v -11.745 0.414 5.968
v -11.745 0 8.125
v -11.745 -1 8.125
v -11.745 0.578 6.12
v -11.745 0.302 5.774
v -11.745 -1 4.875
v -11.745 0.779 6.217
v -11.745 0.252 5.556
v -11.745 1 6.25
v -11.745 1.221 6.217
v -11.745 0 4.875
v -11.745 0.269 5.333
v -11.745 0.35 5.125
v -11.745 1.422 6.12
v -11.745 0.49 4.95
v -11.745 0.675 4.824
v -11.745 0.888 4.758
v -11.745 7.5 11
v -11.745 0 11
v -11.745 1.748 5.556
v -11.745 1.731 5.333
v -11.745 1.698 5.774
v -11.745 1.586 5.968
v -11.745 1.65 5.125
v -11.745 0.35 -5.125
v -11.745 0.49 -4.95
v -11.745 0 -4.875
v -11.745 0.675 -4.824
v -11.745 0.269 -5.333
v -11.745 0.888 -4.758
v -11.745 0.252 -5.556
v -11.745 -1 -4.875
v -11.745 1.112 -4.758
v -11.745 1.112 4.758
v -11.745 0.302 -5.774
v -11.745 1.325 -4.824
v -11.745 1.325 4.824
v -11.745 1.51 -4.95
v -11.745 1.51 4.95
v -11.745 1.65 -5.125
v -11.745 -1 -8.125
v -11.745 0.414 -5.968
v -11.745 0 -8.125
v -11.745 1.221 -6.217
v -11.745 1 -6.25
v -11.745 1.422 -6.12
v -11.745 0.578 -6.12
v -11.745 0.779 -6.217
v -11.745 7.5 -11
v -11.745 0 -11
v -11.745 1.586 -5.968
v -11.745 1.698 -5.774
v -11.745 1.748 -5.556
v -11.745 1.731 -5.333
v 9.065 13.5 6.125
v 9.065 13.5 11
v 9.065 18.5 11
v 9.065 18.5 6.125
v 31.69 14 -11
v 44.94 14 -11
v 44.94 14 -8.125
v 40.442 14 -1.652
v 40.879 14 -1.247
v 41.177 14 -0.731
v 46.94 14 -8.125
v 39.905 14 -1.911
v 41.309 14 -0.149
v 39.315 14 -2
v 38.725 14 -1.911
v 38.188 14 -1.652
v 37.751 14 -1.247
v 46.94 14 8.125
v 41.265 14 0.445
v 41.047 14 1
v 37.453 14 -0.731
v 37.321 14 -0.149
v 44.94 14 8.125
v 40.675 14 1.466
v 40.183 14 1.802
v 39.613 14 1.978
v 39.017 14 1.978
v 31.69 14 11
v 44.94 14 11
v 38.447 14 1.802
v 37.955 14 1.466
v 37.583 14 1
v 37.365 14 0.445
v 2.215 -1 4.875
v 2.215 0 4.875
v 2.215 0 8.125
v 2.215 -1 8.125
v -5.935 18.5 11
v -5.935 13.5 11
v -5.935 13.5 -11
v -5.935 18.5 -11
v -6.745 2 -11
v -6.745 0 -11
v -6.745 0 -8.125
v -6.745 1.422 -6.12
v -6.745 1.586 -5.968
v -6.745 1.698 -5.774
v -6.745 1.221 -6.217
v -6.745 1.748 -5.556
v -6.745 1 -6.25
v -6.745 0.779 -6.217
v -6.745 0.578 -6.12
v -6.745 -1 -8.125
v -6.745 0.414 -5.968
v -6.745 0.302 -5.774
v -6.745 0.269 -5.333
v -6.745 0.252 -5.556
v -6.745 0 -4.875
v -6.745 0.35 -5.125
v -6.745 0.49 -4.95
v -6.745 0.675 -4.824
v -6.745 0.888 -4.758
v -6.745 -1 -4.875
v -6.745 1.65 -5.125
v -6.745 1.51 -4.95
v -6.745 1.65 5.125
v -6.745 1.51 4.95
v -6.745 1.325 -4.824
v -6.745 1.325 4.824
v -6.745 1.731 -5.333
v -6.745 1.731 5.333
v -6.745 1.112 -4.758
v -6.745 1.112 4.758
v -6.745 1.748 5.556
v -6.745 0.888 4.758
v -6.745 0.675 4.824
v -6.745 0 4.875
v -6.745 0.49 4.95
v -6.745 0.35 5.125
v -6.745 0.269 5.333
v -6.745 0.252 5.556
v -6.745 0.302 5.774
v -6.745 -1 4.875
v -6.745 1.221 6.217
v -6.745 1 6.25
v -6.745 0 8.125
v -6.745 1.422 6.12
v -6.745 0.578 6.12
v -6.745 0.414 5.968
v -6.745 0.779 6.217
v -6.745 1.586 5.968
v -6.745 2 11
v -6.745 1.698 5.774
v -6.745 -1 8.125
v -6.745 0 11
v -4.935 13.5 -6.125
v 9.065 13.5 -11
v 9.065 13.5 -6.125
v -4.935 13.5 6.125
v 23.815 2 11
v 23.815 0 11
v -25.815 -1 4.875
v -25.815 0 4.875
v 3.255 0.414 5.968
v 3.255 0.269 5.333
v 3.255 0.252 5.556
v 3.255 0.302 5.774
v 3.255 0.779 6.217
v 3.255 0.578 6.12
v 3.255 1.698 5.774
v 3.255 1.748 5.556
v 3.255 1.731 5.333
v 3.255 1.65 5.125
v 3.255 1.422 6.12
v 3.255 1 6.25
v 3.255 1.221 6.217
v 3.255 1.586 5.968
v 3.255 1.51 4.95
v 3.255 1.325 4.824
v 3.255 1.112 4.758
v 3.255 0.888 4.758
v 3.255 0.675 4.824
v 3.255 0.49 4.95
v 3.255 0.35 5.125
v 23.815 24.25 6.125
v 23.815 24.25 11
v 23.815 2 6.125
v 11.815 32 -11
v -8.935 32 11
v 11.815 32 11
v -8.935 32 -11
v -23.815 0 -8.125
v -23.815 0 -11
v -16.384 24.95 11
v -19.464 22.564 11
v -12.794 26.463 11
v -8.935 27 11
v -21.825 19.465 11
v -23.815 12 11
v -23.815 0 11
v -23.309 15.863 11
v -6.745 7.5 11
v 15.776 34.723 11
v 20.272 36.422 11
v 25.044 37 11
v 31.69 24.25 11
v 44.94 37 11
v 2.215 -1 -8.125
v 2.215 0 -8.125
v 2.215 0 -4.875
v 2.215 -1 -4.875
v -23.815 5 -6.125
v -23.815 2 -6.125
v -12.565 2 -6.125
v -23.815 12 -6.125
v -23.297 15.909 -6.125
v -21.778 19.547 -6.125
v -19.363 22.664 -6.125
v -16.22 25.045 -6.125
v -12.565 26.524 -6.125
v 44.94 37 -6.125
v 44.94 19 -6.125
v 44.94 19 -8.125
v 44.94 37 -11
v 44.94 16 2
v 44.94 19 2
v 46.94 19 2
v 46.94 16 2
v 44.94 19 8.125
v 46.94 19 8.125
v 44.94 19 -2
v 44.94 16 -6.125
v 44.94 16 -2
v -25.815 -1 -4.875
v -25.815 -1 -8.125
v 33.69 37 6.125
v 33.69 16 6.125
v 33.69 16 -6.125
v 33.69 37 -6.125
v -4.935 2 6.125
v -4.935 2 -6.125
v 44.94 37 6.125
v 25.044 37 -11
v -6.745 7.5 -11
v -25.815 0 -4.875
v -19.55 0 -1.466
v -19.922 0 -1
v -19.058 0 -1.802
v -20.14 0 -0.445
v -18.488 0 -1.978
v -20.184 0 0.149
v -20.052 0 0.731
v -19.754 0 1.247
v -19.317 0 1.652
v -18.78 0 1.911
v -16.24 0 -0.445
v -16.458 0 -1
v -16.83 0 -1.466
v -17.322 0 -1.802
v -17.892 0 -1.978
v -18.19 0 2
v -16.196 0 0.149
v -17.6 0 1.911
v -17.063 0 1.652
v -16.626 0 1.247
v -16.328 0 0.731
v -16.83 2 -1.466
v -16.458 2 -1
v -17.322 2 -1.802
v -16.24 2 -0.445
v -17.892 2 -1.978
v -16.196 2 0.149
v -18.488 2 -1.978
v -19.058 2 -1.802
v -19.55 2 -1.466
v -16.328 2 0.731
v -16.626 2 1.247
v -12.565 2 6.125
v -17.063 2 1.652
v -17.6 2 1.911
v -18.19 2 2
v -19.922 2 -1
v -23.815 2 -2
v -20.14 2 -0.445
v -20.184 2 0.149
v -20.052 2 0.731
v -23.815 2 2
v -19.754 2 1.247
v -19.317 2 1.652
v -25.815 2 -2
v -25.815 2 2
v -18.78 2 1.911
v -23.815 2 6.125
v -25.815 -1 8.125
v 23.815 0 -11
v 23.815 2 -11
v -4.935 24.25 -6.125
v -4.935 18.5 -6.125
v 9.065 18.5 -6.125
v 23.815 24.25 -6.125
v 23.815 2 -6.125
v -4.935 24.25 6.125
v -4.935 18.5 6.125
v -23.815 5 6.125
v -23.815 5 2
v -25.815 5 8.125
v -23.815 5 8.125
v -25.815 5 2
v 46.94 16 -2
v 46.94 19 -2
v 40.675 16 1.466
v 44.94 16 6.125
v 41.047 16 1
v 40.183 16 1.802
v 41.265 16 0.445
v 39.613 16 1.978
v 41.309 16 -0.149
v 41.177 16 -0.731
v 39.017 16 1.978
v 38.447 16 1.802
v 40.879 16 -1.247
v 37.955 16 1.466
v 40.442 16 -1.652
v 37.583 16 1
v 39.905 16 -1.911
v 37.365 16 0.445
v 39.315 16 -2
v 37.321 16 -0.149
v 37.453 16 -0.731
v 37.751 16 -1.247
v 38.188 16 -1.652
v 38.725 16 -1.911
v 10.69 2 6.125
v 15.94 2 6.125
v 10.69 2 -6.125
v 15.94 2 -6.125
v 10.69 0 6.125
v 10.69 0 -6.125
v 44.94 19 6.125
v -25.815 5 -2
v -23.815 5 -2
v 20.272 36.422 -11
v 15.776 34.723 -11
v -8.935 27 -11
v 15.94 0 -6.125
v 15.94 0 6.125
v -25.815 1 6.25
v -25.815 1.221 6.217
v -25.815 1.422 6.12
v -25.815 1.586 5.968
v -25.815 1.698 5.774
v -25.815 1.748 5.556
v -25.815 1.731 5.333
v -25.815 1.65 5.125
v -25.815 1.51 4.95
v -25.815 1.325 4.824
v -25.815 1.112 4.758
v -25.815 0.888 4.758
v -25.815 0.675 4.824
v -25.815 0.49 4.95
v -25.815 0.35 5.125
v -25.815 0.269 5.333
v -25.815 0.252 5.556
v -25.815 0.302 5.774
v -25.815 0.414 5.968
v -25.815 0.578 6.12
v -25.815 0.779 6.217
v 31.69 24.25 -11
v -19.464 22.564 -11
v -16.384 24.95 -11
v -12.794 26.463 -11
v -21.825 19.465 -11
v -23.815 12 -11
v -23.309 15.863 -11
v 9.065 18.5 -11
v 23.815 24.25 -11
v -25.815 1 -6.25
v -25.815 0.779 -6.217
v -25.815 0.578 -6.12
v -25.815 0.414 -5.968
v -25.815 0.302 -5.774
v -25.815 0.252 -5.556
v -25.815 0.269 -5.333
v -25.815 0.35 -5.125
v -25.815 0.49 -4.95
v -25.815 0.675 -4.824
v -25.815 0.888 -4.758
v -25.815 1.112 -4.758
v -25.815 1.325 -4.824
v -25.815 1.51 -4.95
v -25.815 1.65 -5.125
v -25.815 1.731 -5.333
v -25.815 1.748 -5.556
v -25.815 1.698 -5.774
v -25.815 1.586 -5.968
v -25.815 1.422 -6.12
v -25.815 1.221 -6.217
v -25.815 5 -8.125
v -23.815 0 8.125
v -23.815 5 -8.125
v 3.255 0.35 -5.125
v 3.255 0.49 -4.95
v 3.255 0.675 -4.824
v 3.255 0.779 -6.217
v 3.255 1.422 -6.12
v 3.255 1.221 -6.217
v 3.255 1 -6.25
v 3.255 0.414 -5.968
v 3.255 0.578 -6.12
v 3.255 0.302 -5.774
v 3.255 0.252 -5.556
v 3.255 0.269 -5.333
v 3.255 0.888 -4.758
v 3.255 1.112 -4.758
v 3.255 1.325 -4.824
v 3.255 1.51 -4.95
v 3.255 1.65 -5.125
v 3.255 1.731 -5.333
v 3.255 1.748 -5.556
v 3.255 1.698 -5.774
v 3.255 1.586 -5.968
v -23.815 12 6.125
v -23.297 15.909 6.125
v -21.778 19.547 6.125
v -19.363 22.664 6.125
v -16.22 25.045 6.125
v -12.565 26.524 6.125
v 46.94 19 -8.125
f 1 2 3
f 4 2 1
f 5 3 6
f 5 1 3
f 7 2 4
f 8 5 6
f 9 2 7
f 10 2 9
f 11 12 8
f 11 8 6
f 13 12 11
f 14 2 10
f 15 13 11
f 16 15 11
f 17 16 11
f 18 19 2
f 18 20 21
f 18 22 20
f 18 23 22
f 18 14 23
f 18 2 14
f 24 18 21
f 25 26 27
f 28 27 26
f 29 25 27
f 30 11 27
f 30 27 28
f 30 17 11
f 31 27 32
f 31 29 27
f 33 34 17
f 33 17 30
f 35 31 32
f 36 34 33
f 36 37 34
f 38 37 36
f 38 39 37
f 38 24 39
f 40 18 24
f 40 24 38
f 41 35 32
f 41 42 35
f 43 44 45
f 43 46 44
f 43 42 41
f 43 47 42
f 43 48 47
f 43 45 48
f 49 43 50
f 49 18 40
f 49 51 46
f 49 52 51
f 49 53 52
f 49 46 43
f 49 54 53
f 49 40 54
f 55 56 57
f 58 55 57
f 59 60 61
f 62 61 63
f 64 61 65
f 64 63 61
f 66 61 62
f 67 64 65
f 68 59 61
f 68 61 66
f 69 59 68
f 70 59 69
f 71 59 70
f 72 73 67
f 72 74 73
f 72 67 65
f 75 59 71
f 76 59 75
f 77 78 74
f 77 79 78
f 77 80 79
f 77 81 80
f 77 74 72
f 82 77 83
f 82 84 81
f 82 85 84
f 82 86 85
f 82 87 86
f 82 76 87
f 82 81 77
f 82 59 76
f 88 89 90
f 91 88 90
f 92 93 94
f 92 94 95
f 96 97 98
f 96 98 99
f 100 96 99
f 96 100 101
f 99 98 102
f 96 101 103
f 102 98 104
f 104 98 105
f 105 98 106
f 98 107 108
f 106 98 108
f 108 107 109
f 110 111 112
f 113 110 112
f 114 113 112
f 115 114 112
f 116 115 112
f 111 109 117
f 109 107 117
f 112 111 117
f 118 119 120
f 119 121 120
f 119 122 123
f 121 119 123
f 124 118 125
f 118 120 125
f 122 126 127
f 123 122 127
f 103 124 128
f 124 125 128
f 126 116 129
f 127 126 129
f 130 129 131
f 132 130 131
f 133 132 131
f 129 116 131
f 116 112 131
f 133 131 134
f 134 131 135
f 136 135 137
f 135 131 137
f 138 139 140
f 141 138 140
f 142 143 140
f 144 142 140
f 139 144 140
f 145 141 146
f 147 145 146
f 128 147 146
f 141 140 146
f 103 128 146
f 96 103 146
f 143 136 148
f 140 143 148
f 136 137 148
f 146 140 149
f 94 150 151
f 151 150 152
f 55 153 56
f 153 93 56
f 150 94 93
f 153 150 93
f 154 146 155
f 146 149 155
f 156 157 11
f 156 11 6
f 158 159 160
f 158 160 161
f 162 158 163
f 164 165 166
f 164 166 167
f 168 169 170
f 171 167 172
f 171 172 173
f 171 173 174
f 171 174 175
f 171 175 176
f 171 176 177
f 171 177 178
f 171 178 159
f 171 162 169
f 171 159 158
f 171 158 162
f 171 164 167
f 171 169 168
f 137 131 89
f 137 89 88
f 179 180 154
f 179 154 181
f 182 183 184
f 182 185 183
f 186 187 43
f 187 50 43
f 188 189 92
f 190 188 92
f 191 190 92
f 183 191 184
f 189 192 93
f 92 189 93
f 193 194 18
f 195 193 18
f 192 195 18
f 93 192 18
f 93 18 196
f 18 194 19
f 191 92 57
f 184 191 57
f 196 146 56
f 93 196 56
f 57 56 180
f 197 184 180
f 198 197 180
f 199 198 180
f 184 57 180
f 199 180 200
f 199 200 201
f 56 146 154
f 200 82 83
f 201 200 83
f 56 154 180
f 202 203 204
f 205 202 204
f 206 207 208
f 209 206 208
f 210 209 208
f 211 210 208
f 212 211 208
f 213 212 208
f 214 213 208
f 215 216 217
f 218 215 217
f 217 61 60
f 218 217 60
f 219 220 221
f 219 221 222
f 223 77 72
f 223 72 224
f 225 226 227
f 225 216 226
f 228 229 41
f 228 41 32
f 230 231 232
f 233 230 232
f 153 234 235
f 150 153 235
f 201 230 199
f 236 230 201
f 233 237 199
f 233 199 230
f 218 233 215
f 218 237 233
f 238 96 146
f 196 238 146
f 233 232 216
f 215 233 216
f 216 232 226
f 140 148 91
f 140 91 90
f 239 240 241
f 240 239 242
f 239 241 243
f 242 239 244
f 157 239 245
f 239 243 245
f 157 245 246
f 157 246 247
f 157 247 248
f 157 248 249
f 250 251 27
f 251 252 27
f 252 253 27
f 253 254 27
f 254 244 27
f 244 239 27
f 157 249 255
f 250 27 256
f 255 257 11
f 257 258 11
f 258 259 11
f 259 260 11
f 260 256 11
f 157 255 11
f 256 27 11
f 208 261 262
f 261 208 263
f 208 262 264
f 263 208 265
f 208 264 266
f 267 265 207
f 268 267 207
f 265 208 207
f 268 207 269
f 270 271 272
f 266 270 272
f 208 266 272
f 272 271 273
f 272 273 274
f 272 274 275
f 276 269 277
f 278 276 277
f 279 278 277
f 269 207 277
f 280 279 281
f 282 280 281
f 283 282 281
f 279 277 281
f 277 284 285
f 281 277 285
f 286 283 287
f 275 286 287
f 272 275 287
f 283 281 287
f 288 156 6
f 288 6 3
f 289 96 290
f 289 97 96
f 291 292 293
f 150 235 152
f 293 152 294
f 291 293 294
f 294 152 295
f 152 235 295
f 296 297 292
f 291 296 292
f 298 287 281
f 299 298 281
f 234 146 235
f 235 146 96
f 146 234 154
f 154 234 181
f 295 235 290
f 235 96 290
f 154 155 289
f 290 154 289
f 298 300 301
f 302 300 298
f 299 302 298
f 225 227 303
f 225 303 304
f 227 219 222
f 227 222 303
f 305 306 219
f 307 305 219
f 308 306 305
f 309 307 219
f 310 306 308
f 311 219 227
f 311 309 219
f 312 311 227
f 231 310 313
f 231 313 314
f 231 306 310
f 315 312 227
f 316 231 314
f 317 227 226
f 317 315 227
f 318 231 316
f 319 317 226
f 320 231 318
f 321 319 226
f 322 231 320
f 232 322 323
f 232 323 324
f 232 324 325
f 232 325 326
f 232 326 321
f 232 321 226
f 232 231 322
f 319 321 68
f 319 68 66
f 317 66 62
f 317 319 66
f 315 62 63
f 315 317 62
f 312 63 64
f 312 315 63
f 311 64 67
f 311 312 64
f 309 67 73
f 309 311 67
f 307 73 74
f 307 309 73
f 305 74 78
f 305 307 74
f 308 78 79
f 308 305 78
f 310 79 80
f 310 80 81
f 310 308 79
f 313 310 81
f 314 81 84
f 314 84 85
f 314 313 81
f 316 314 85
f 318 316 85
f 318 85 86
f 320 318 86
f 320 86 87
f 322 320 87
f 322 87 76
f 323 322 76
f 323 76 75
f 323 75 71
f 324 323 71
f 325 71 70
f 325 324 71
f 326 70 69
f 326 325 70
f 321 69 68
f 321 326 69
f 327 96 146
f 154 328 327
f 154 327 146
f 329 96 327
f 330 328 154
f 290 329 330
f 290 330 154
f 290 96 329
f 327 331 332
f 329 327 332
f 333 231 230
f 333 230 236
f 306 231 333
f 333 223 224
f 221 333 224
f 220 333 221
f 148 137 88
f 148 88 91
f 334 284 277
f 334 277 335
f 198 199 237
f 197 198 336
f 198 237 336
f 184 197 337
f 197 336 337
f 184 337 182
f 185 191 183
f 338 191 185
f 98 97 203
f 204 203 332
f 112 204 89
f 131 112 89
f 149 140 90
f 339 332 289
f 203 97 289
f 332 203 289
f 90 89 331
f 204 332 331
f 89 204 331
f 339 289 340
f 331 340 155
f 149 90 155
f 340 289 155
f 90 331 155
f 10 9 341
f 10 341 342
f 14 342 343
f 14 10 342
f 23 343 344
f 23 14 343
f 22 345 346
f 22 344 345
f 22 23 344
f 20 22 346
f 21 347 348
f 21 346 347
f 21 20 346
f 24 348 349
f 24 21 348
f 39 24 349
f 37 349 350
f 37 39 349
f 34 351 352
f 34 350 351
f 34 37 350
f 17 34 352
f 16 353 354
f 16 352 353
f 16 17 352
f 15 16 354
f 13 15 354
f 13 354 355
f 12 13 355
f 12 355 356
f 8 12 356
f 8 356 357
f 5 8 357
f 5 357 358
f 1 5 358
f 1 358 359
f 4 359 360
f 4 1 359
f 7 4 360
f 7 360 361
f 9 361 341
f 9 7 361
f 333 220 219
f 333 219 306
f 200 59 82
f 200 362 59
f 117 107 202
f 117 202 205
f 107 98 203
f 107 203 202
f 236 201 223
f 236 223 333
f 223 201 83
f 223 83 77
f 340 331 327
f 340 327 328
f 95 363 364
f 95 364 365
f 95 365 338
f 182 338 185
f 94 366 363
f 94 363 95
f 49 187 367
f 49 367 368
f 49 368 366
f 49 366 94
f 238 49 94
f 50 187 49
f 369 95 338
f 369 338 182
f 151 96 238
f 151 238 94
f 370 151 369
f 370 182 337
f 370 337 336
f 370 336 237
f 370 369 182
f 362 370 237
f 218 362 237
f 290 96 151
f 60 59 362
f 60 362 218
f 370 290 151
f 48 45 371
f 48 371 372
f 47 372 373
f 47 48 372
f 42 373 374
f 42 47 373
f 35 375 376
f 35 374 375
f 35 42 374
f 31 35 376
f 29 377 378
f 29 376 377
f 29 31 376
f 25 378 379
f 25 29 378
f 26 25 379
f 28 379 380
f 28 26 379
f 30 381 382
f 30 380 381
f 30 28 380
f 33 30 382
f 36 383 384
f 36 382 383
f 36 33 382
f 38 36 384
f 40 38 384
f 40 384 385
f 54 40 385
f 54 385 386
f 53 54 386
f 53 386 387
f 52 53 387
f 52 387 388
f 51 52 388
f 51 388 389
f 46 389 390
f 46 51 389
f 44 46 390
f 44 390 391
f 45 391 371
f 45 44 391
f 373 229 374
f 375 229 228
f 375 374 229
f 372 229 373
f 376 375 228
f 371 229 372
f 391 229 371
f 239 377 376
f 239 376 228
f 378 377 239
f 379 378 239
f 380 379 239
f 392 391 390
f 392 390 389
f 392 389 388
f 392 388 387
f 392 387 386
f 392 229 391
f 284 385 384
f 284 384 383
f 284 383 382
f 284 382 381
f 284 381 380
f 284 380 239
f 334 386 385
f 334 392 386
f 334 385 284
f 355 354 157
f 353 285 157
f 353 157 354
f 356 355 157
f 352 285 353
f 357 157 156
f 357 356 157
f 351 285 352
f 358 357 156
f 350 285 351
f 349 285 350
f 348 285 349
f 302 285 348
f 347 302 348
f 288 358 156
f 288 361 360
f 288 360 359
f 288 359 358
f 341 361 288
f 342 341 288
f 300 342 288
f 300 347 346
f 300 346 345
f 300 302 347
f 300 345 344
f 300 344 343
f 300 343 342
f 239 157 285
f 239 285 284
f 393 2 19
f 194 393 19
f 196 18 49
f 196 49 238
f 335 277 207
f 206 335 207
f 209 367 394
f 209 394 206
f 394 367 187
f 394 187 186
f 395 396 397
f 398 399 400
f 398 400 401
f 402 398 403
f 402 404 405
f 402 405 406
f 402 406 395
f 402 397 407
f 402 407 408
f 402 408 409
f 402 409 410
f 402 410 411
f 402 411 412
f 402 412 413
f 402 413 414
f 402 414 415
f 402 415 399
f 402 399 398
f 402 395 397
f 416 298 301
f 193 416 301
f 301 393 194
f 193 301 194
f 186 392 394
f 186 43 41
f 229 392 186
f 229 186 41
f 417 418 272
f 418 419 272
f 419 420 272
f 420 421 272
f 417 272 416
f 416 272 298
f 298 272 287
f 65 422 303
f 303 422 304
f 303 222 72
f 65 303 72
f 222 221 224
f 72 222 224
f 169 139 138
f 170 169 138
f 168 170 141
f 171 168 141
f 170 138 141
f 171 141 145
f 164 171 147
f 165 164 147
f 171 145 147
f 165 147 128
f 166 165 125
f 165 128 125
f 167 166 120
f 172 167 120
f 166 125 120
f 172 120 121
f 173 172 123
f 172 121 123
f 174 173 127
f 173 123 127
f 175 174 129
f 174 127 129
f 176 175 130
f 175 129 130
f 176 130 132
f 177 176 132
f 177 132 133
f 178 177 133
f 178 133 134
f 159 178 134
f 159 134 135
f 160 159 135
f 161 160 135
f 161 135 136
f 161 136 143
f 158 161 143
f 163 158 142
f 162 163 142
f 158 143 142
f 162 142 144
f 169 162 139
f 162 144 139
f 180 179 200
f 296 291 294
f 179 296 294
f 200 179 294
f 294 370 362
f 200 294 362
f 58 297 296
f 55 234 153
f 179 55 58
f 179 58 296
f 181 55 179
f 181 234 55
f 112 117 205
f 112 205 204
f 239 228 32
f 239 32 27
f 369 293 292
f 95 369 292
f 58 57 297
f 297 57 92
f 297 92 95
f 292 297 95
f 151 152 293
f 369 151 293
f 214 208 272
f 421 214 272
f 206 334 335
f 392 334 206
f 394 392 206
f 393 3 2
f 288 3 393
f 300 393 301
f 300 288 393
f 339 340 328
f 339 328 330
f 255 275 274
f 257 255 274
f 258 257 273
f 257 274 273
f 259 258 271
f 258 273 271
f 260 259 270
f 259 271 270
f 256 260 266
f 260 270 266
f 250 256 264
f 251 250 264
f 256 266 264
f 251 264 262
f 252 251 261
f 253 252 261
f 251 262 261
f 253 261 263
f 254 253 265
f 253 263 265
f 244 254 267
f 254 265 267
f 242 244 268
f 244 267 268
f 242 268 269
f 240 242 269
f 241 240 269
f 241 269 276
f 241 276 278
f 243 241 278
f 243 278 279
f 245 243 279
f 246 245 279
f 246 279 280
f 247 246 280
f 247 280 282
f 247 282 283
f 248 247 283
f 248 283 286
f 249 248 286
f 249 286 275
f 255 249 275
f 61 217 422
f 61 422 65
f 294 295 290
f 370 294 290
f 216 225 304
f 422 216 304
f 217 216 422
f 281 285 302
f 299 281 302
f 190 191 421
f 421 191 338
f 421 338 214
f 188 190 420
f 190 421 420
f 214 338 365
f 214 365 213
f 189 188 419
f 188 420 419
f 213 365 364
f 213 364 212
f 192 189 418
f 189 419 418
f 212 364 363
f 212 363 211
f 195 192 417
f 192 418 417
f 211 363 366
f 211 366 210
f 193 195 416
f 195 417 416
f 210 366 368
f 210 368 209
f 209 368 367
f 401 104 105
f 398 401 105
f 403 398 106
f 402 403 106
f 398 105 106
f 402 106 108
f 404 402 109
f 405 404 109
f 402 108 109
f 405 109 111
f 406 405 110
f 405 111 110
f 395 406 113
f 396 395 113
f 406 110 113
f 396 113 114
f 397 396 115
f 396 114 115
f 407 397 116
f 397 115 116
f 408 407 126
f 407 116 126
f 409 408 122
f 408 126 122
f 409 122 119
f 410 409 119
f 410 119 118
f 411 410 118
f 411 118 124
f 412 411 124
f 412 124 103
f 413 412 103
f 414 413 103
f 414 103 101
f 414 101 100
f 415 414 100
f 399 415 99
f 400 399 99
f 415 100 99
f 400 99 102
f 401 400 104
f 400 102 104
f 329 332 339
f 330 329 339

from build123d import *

# Parameters (mm, degrees)
SKETCH1_W              = 47.63
SKETCH1_H              = 22
SKETCH1_W_2            = 5.25
SKETCH1_H_2            = 12.25
BOSS_EXTRUDE1_DEPTH    = 2
SKETCH3_W              = 32.75
SKETCH3_H              = 22
BOSS_EXTRUDE2_DEPTH    = 30
SKETCH2_W              = 28.75
SKETCH2_H              = 12.25
CUT_EXTRUDE1_DEPTH     = 22.25
BOSS_EXTRUDE7_DEPTH    = 25
SKETCH19_W             = 16.25
SKETCH19_H             = 2
BOSS_EXTRUDE8_DEPTH    = 2
SKETCH20_W             = 2
SKETCH20_H             = 16.25
BOSS_EXTRUDE9_DEPTH    = 3
SKETCH39_W             = 4
SKETCH39_H             = 3
CUT_EXTRUDE16_DEPTH    = 2
BOSS_EXTRUDE11_DEPTH   = 28.03
SKETCH10_W             = 5
SKETCH10_H             = 22
CUT_EXTRUDE6_DEPTH     = 7.5
SKETCH21_R             = 0.75
CUT_EXTRUDE12_DEPTH    = 10
SKETCH21_5_R           = 0.75
CUT_EXTRUDE13_DEPTH    = 46.595105
SKETCH10_3_W           = 5
SKETCH10_3_H           = 2.875
SKETCH10_3_H_2         = 3.25
SKETCH10_3_H_3         = 9.75
CUT_EXTRUDE14_DEPTH    = 43.560712224
SKETCH25_W             = 14
SKETCH25_H             = 5
SKETCH25_W_2           = 1
CUT_EXTRUDE15_DEPTH    = 47.630614675
FILLET2_R              = 15
SKETCH29_W             = 9.875
SKETCH29_H             = 22
BOSS_EXTRUDE12_DEPTH   = 7.75
SKETCH30_W             = 11.25
SKETCH30_H             = 4.875
BOSS_EXTRUDE13_DEPTH   = 16
SKETCH36_W             = 13.25
SKETCH36_H             = 22
SKETCH36_R             = 2
BOSS_EXTRUDE16_DEPTH   = 2
SKETCH30_4_W           = 11.25
SKETCH30_4_H           = 4.875
BOSS_EXTRUDE18_DEPTH   = 5
BOSS_EXTRUDE19_DEPTH   = 2
SKETCH29_3_W           = 9.875
SKETCH29_3_H           = 22
BOSS_EXTRUDE20_DEPTH   = 5
SKETCH40_W             = 12
SKETCH40_H             = 22
BOSS_EXTRUDE21_DEPTH   = 5
FILLET5_R              = 20
SPLIT2_SURFACE_1_BACK  = 85.978
SPLIT2_SURFACE_1_DEPTH = 171.956
SPLIT2_SURFACE_2_BACK  = 85.978
SPLIT2_SURFACE_2_DEPTH = 171.956
SKETCH45_R             = 2
CUT_EXTRUDE17_DEPTH    = 60.57653565


with BuildPart() as part:
    # Sketch1 → Boss-Extrude1 (new body)
    with BuildSketch(Plane(origin=(0, 0, 0), x_dir=(1, 0, 0), z_dir=(0, 1, 0))):
        Rectangle(SKETCH1_W, SKETCH1_H)
        with Locations((13.315, 0)):
            Rectangle(SKETCH1_W_2, SKETCH1_H_2, mode=Mode.SUBTRACT)
    extrude(amount=BOSS_EXTRUDE1_DEPTH)

    # Sketch3 → Boss-Extrude2 (add)
    with BuildSketch(Plane(origin=(0, 2, 0), x_dir=(1, 0, 0), z_dir=(0, 1, 0))):
        with Locations((7.44, 0)):
            Rectangle(SKETCH3_W, SKETCH3_H)
    extrude(amount=BOSS_EXTRUDE2_DEPTH)

    # Sketch2 → Cut-Extrude1 (cut)
    with BuildSketch(Plane(origin=(0, 2, 0), x_dir=(1, 0, 0), z_dir=(0, 1, 0))):
        with Locations((9.44, 0)):
            Rectangle(SKETCH2_W, SKETCH2_H)
    extrude(amount=CUT_EXTRUDE1_DEPTH, mode=Mode.SUBTRACT)

    # Sketch18 → Boss-Extrude7 (add)
    with BuildSketch(Plane(origin=(0, 2, 0), x_dir=(1, 0, 0), z_dir=(0, 1, 0))):
        Polygon((-23.815, 11), (-23.815, 6.125), (-12.565, 6.125), (-12.565, -6.125), (-23.815, -6.125), (-23.815, -11), (-8.935, -11), (-8.935, 11), align=None)
    extrude(amount=BOSS_EXTRUDE7_DEPTH)

    # Sketch19 → Boss-Extrude8 (add)
    with BuildSketch(Plane.ZY.offset(23.815)):
        with Locations((0, 1)):
            Rectangle(SKETCH19_W, SKETCH19_H)
    extrude(amount=BOSS_EXTRUDE8_DEPTH)

    # Sketch20 → Boss-Extrude9 (add)
    with BuildSketch(Plane(origin=(0, 2, 0), x_dir=(1, 0, 0), z_dir=(0, 1, 0))):
        with Locations((-24.815, 0)):
            Rectangle(SKETCH20_W, SKETCH20_H)
    extrude(amount=BOSS_EXTRUDE9_DEPTH)

    # Sketch39 → Cut-Extrude16 (cut)
    with BuildSketch(Plane.ZY.offset(25.815)):
        with Locations((0, 3.5)):
            Rectangle(SKETCH39_W, SKETCH39_H)
    extrude(amount=-CUT_EXTRUDE16_DEPTH, mode=Mode.SUBTRACT)

    # Sketch24 → Boss-Extrude11 (add)
    with BuildSketch(Plane.ZY.offset(25.815)):
        Polygon((-8.125, 0), (-8.125, -1), (-4.875, -1), (-4.875, 0), (-4.875, 0.25), (-8.125, 0.25), align=None)
        Polygon((8.125, 0), (8.125, 0.25), (4.875, 0.25), (4.875, 0), (4.875, -1), (8.125, -1), align=None)
    extrude(amount=-BOSS_EXTRUDE11_DEPTH)

    # Sketch10 → Cut-Extrude6 (cut)
    with BuildSketch(Plane.XZ):
        with Locations((-9.245, 0)):
            Rectangle(SKETCH10_W, SKETCH10_H)
    extrude(amount=-CUT_EXTRUDE6_DEPTH, mode=Mode.SUBTRACT)

    # Sketch21 → Cut-Extrude12 (cut)
    with BuildSketch(Plane.ZY.offset(6.745)):
        with Locations((5.5, 1)):
            Circle(SKETCH21_R)
        with Locations(Location((-5.5, 1, 0), (0, 0, 180))):
            Circle(SKETCH21_R)
    extrude(amount=-CUT_EXTRUDE12_DEPTH, mode=Mode.SUBTRACT)

    # Sketch21<5> → Cut-Extrude13 (cut, through all)
    with BuildSketch(Plane.ZY.offset(6.745)):
        with Locations((5.5, 1)):
            Circle(SKETCH21_5_R)
        with Locations(Location((-5.5, 1, 0), (0, 0, 180))):
            Circle(SKETCH21_5_R)
    extrude(amount=CUT_EXTRUDE13_DEPTH, mode=Mode.SUBTRACT)

    # Sketch10<3> → Cut-Extrude14 (cut, through all)
    with BuildSketch(Plane.XZ):
        with Locations((-9.245, -9.5625)):
            Rectangle(SKETCH10_3_W, SKETCH10_3_H)
        with Locations((-9.245, -6.5)):
            Rectangle(SKETCH10_3_W, SKETCH10_3_H_2)
        with Locations((-9.245, 0)):
            Rectangle(SKETCH10_3_W, SKETCH10_3_H_3)
        with Locations((-9.245, 6.5)):
            Rectangle(SKETCH10_3_W, SKETCH10_3_H_2)
        with Locations((-9.245, 9.5625)):
            Rectangle(SKETCH10_3_W, SKETCH10_3_H)
    extrude(amount=CUT_EXTRUDE14_DEPTH, mode=Mode.SUBTRACT)

    # Sketch25 → Cut-Extrude15 (cut, through all)
    with BuildSketch(Plane.XY.offset(11)):
        with Locations((2.065, 16)):
            Rectangle(SKETCH25_W, SKETCH25_H)
        with Locations((-5.435, 16)):
            Rectangle(SKETCH25_W_2, SKETCH25_H)
    extrude(amount=-CUT_EXTRUDE15_DEPTH, mode=Mode.SUBTRACT)

    # Fillet2
    # the kernel refuses this fillet: 15 mm, written as the material it takes off along each edge
    with BuildSketch(Plane(origin=(-23.815, 27, -31.375), x_dir=(1, 0, 0), z_dir=(0, 0, 1))) as fillet2_piece_1_section:
        with BuildLine():
            CenterArc((FILLET2_R, -FILLET2_R), FILLET2_R, 90, 90)
            Line((0, -FILLET2_R), (0, 0))
            Line((0, 0), (FILLET2_R, 0))
        make_face()
    fillet2_piece_1 = extrude(amount=79.875, mode=Mode.PRIVATE)
    fillet2_piece_1 = split(fillet2_piece_1, bisect_by=Plane(origin=(-8.935, 23.601845872, 8.5625), z_dir=(-1, 0, 0)), keep=Keep.TOP, mode=Mode.PRIVATE)
    add(fillet2_piece_1, mode=Mode.SUBTRACT)

    # Sketch29 → Boss-Extrude12 (add)
    with BuildSketch(Plane(origin=(0, 32, 0), x_dir=(1, 0, 0), z_dir=(0, 1, 0))):
        with Locations((28.7525, 0)):
            Rectangle(SKETCH29_W, SKETCH29_H)
    extrude(amount=-BOSS_EXTRUDE12_DEPTH)

    # Sketch30 → Boss-Extrude13 (add)
    with BuildSketch(Plane(origin=(0, 32, 0), x_dir=(1, 0, 0), z_dir=(0, 1, 0))):
        Polygon((33.69, 6.125), (33.69, 11), (31.69, 11), (31.69, -11), (33.69, -11), (33.69, -6.125), align=None)
        with Locations((39.315, 8.5625)):
            Rectangle(SKETCH30_W, SKETCH30_H)
        with Locations((39.315, -8.5625)):
            Rectangle(SKETCH30_W, SKETCH30_H)
    extrude(amount=-BOSS_EXTRUDE13_DEPTH)

    # Sketch36 → Boss-Extrude16 (add)
    with BuildSketch(Plane.XZ.offset(-16)):
        with Locations((38.315, 0)):
            Rectangle(SKETCH36_W, SKETCH36_H)
        with Locations(Location((39.315, 0, 0), (0, 0, 270))):
            Circle(SKETCH36_R, mode=Mode.SUBTRACT)
    extrude(amount=BOSS_EXTRUDE16_DEPTH)

    # Sketch30<4> → Boss-Extrude18 (add)
    with BuildSketch(Plane(origin=(0, 32, 0), x_dir=(1, 0, 0), z_dir=(0, 1, 0))):
        with Locations((39.315, 8.5625)):
            Rectangle(SKETCH30_4_W, SKETCH30_4_H)
        Polygon((33.69, 6.125), (33.69, 11), (31.69, 11), (31.69, -11), (33.69, -11), (33.69, -6.125), align=None)
        with Locations((39.315, -8.5625)):
            Rectangle(SKETCH30_4_W, SKETCH30_4_H)
    extrude(amount=BOSS_EXTRUDE18_DEPTH)

    # Sketch38 → Boss-Extrude19 (add)
    with BuildSketch(Plane(origin=(44.94, 0, 0), x_dir=(0, 0, -1), z_dir=(1, 0, 0))):
        Polygon((-8.125, 19), (-2, 19), (-2, 16), (2, 16), (2, 19), (8.125, 19), (8.125, 14), (-8.125, 14), align=None)
    extrude(amount=BOSS_EXTRUDE19_DEPTH)

    # Sketch29<3> → Boss-Extrude20 (add)
    with BuildSketch(Plane(origin=(0, 32, 0), x_dir=(1, 0, 0), z_dir=(0, 1, 0))):
        with Locations((28.7525, 0)):
            Rectangle(SKETCH29_3_W, SKETCH29_3_H)
    extrude(amount=BOSS_EXTRUDE20_DEPTH)

    # Sketch40 → Boss-Extrude21 (add)
    with BuildSketch(Plane(origin=(0, 32, 0), x_dir=(1, 0, 0), z_dir=(0, 1, 0))):
        with Locations((17.815, 0)):
            Rectangle(SKETCH40_W, SKETCH40_H)
    extrude(amount=BOSS_EXTRUDE21_DEPTH)

    # Fillet5
    # the kernel refuses this fillet: 20 mm, written as the material it takes off along each edge
    with BuildSketch(Plane(origin=(11.815, 37, -44.071891388), x_dir=(0, -1, 0), z_dir=(0, 0, 1))) as fillet5_piece_1:
        with BuildLine():
            CenterArc((20, 13.228756555), FILLET5_R, 180, 41.409622109)
            Line((0, 13.228756555), (-0.4, 13.228756555))
            Line((-0.4, 13.228756555), (-0.4, 0))
            Line((-0.4, 0), (0, -0.4))
            ThreePointArc((0, -0.4), (2.5, -0.4), (4.7, -0.264575131))
            Line((4.7, -0.264575131), (5, 0))
        make_face()
    extrude(amount=88.143782777, mode=Mode.SUBTRACT)


with BuildPart() as body_2:
    # Split2: the piece behind the surface
    add(part.part)
    # Split2 surface: a surface, the sketch's curves swept straight by 171.956 mm
    with BuildLine(Plane.XY.offset(11).offset(-SPLIT2_SURFACE_1_BACK), mode=Mode.PRIVATE) as split2_surface_1_path:
        Line((-6.745, 2), (23.815, 2))
    split2_surface_1 = Shell.extrude(split2_surface_1_path.wire(), (0 * SPLIT2_SURFACE_1_DEPTH, 0 * SPLIT2_SURFACE_1_DEPTH, 1 * SPLIT2_SURFACE_1_DEPTH))
    split(bisect_by=split2_surface_1, keep=Keep.BOTTOM)


with BuildPart() as part_1:
    add(part.part)

    # Split2: split by a surface, the side it looks to stays
    # Split2 surface: a surface, the sketch's curves swept straight by 171.956 mm
    with BuildLine(Plane.XY.offset(11).offset(-SPLIT2_SURFACE_2_BACK), mode=Mode.PRIVATE) as split2_surface_2_path:
        Line((-6.745, 2), (23.815, 2))
    split2_surface_2 = Shell.extrude(split2_surface_2_path.wire(), (0 * SPLIT2_SURFACE_2_DEPTH, 0 * SPLIT2_SURFACE_2_DEPTH, 1 * SPLIT2_SURFACE_2_DEPTH))
    split(bisect_by=split2_surface_2, keep=Keep.TOP)

    # Sketch45 → Cut-Extrude17 (cut, through all)
    with BuildSketch(Plane(origin=(0, 2, 0), x_dir=(1, 0, 0), z_dir=(0, 1, 0))):
        with Locations(Location((-18.19, 0, 0), (0, 0, 270))):
            Circle(SKETCH45_R)
    extrude(amount=-CUT_EXTRUDE17_DEPTH, mode=Mode.SUBTRACT)


solid = Compound([body_2.part, part_1.part])
